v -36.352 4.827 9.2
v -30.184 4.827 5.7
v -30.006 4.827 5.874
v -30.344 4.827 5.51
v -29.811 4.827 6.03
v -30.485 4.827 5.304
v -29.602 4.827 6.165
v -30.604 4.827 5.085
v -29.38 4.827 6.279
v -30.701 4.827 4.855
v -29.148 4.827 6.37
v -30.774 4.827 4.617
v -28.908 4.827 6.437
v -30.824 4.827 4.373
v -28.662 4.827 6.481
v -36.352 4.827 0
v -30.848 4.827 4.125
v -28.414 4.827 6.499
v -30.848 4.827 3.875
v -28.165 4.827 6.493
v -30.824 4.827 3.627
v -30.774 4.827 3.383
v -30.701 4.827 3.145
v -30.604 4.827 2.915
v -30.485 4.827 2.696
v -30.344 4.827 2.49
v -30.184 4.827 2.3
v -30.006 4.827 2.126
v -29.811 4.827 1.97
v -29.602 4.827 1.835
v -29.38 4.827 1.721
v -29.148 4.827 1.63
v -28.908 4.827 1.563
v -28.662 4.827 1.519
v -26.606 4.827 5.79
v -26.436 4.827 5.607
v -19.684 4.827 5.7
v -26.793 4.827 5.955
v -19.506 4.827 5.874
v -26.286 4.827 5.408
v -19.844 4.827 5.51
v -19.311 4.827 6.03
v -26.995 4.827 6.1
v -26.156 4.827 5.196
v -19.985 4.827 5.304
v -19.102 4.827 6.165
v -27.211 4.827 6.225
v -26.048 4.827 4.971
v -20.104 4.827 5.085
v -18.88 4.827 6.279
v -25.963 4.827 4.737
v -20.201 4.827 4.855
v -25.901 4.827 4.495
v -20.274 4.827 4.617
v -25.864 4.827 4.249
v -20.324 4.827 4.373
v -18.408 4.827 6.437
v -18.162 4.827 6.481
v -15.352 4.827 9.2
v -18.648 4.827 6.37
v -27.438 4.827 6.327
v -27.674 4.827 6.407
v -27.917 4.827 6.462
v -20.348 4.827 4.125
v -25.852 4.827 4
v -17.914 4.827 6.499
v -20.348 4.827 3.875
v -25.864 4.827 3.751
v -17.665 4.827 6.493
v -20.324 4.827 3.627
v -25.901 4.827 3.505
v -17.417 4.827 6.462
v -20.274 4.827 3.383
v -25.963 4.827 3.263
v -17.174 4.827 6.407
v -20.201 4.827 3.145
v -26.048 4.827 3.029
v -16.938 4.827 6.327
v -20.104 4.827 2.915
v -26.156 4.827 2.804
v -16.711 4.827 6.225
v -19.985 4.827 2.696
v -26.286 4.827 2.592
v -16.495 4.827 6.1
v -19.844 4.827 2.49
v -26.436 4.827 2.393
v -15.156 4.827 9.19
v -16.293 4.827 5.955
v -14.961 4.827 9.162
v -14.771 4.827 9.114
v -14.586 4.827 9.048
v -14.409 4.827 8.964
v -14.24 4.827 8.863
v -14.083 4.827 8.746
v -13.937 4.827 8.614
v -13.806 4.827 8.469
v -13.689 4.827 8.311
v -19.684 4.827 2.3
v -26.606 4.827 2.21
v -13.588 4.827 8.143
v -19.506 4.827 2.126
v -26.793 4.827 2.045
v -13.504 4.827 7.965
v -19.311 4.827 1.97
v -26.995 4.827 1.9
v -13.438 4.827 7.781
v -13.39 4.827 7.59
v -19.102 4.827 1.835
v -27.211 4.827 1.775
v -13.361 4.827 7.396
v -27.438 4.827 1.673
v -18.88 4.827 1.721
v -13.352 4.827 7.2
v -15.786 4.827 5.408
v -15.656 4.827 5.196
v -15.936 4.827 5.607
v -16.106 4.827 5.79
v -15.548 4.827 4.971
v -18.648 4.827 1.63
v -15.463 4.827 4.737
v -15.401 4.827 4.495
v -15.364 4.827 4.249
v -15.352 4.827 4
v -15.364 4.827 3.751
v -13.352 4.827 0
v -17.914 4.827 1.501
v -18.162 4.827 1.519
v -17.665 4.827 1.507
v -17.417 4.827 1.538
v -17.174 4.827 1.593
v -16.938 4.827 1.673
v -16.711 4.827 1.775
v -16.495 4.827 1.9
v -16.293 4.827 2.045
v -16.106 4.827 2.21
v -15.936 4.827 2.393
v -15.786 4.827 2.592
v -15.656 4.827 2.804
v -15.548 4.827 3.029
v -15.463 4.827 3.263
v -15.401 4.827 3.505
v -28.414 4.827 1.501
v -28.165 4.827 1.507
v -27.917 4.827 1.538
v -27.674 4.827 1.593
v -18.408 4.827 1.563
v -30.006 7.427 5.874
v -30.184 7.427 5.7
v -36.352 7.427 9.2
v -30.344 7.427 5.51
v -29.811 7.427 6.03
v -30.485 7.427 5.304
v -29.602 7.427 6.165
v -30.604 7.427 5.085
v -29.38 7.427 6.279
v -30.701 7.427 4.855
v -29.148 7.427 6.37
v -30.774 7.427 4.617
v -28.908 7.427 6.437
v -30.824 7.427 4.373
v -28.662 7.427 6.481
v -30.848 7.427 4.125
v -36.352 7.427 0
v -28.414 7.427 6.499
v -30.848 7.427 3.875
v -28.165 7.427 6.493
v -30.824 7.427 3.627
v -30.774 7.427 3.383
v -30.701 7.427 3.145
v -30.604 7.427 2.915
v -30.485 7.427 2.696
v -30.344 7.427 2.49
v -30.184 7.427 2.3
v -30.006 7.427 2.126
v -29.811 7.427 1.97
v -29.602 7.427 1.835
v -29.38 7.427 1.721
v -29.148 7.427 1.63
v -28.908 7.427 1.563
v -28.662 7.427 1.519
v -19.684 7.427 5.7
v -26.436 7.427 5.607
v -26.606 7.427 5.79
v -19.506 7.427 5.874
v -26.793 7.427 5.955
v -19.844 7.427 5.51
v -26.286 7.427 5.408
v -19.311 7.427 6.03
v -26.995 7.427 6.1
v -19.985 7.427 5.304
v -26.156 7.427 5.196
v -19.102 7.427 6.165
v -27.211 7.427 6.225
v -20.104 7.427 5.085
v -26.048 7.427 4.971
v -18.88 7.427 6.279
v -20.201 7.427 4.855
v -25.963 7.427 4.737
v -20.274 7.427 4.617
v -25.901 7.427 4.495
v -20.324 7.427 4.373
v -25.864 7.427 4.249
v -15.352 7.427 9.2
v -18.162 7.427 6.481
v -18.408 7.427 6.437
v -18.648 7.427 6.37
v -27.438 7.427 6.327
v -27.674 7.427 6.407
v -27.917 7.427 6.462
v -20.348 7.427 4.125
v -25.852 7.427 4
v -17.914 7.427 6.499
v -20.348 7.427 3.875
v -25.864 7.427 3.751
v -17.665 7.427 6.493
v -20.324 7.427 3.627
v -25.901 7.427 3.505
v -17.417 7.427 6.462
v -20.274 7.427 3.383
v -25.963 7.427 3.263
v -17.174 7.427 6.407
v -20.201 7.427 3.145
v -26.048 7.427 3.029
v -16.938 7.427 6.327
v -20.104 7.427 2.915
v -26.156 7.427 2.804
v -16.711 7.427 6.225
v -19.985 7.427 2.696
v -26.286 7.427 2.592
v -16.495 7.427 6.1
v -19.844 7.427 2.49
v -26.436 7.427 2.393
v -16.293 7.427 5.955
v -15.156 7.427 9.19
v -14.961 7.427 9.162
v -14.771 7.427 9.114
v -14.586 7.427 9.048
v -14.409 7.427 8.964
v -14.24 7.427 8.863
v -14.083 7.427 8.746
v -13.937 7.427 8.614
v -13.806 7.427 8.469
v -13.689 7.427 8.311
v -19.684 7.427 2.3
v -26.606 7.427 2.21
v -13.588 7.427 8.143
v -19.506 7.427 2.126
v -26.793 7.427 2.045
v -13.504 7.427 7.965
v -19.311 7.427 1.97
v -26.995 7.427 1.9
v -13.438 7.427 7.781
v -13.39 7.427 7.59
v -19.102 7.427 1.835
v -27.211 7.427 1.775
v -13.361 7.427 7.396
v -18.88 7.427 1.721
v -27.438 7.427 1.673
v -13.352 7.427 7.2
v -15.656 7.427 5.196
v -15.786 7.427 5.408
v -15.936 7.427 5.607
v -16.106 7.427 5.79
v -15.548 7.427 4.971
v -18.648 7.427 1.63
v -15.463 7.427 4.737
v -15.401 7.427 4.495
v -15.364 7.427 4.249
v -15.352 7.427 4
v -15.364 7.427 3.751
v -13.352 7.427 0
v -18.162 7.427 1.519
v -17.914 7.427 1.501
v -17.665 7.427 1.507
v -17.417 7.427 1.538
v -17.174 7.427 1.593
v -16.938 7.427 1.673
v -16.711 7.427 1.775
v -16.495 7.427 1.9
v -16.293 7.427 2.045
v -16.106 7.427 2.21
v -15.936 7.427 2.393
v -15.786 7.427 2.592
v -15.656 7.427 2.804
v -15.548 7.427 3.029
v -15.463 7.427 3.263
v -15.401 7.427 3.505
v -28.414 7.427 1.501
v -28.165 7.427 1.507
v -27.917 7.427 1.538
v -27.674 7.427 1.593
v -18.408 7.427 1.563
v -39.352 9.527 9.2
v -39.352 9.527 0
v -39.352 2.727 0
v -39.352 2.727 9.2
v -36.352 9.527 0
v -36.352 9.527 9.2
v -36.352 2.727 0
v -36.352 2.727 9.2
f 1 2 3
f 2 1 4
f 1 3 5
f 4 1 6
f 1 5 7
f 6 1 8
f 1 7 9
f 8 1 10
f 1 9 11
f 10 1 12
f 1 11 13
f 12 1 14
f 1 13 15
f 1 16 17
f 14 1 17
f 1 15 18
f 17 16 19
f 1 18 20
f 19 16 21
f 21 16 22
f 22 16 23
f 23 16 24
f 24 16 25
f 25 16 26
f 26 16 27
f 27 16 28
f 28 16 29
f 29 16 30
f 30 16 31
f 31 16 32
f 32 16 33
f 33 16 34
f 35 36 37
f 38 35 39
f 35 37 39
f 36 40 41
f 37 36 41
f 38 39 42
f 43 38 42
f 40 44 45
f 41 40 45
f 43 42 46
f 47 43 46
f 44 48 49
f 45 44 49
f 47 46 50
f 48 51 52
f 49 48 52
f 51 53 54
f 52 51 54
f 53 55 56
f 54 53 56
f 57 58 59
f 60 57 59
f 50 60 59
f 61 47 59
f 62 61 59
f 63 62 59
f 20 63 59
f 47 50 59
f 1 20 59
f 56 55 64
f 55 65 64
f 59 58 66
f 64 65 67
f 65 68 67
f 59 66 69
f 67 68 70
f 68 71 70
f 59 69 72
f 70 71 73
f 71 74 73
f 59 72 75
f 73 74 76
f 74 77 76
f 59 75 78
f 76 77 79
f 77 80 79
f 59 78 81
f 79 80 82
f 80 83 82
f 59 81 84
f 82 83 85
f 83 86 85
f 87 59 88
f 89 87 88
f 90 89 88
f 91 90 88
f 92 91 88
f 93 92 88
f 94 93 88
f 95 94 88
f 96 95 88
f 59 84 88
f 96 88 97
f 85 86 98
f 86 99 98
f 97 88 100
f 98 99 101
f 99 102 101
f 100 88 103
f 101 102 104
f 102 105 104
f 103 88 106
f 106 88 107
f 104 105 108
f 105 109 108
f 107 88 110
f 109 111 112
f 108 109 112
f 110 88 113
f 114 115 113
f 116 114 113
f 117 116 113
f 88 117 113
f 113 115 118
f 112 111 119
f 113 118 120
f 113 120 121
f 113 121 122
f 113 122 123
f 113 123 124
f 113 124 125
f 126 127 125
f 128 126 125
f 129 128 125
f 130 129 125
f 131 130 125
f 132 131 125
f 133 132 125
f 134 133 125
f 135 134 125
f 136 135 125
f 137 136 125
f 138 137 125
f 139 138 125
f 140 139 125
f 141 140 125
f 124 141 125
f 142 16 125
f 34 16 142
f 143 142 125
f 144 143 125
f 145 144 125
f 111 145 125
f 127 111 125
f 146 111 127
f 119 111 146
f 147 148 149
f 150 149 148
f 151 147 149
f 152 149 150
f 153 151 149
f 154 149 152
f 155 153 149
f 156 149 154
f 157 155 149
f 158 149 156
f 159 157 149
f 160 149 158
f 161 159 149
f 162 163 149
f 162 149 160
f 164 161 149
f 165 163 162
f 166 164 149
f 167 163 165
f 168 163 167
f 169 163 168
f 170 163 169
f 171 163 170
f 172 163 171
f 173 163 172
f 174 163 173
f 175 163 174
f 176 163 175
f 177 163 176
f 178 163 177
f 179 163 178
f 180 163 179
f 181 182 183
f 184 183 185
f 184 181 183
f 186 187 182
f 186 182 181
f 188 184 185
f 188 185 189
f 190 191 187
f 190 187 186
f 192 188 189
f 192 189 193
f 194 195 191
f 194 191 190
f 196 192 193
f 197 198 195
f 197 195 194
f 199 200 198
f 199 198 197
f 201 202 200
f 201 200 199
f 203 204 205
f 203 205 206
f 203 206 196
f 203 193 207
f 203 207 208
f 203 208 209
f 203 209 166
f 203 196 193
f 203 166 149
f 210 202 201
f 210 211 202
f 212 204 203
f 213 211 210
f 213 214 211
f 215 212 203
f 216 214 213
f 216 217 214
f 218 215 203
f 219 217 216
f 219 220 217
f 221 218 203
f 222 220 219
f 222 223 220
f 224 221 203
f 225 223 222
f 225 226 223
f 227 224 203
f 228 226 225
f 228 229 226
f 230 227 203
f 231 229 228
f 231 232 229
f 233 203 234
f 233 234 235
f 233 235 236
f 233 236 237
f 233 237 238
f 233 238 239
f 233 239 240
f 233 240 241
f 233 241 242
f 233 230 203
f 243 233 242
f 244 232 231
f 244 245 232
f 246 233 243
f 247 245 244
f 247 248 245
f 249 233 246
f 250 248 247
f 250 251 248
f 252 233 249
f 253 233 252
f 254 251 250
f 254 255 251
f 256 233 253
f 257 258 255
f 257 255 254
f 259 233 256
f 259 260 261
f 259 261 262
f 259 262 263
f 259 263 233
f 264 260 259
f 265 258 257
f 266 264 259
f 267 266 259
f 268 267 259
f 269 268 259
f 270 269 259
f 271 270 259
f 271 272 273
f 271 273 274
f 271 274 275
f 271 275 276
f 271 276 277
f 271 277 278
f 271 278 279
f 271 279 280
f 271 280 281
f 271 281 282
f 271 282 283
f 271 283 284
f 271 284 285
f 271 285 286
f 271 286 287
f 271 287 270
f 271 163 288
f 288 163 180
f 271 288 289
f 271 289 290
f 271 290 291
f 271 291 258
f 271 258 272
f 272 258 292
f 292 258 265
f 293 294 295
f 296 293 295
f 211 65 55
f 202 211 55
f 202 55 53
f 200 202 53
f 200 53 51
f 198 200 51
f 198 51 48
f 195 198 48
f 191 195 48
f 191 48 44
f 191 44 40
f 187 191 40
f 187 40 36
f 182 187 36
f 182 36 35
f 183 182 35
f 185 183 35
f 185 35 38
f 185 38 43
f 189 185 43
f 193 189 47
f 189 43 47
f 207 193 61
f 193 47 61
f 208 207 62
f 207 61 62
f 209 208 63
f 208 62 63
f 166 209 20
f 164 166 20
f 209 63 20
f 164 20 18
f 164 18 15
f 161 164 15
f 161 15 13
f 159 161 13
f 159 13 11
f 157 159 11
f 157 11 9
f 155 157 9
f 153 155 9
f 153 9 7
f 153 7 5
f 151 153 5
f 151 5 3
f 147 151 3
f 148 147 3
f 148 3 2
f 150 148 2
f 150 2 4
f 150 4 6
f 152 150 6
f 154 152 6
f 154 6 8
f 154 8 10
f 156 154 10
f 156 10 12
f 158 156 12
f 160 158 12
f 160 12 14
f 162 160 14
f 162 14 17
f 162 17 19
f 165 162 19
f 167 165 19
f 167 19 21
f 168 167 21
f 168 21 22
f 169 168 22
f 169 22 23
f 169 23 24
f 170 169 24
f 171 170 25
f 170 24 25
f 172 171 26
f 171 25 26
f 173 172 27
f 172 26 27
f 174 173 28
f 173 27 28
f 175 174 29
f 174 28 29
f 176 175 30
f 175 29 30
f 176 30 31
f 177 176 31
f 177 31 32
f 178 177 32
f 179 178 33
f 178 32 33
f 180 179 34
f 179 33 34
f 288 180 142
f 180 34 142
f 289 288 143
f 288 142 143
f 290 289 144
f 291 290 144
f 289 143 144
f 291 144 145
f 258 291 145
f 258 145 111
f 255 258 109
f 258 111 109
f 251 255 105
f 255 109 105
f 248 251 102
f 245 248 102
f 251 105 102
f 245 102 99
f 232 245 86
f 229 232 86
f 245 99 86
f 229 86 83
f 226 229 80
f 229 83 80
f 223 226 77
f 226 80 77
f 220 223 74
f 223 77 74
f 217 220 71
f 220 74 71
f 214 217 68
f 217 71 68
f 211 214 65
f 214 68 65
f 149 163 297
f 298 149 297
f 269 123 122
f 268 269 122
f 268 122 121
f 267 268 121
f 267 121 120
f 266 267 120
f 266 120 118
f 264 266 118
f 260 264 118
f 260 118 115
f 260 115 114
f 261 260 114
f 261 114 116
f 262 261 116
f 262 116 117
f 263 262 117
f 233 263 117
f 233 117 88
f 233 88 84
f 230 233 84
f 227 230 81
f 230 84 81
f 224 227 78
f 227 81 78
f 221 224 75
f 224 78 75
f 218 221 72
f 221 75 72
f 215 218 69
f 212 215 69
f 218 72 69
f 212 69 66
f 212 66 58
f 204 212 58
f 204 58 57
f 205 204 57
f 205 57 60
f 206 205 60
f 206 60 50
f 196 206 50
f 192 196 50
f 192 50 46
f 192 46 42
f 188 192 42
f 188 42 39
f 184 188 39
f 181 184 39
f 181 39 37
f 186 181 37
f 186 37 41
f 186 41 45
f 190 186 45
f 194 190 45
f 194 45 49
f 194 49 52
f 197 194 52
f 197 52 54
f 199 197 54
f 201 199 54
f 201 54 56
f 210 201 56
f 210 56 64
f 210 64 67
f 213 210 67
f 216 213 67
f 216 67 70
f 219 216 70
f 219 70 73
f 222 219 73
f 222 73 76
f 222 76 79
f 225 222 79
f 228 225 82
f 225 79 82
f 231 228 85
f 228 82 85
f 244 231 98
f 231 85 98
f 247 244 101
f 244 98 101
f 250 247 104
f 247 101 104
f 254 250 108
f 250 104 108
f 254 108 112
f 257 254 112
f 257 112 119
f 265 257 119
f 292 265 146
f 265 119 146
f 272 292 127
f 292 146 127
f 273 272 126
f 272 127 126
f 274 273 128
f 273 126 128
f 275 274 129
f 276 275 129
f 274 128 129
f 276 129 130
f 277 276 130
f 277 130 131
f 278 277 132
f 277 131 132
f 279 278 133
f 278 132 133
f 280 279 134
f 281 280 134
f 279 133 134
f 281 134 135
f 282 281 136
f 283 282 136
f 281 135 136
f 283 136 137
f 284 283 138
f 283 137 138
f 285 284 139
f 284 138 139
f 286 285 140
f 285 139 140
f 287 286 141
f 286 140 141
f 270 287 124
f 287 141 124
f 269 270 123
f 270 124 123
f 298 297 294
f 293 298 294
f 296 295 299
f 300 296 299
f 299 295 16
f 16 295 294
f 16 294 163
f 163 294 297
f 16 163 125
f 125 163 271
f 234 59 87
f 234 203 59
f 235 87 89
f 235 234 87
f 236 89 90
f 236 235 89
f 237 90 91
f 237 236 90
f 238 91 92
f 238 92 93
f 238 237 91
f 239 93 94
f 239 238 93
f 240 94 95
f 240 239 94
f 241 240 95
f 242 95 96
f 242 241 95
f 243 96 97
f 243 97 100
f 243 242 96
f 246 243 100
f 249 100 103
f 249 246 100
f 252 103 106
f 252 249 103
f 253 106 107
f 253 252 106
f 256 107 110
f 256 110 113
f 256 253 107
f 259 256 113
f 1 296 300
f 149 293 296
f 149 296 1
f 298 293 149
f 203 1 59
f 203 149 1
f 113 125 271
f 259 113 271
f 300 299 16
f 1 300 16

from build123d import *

# Parameters (mm, degrees)
F0_W     = 23
F0_H     = 2.6
F1_DEPTH = 9.2
F2_R     = 2.5
F3_DEPTH = 3.1
F4_R     = 2


with BuildPart() as f1:
    # F0 (on Top) → F1 (new body)
    with BuildSketch(Plane.XY):
        Polygon((-39.351552, 9.527253), (-39.351552, 2.727253), (-36.351552, 2.727253), (-36.351552, 4.827253), (-36.351552, 7.427253), (-36.351552, 9.527253), align=None)
        with Locations((-24.851552, 6.127253)):
            Rectangle(F0_W, F0_H)
    extrude(amount=F1_DEPTH)

    # F2 (on face) → F3 (cut)
    with BuildSketch(Plane.XZ.offset(-4.827253)):
        with Locations((-28.351552, 4)):
            Circle(F2_R)
        with Locations((-17.851552, 4)):
            Circle(F2_R)
    extrude(amount=-F3_DEPTH, mode=Mode.SUBTRACT)

    # F4
    f4_edges = [f1.edges().sort_by_distance(p)[0] for p in [
        (-13.351552, 6.127253, 9.2),
    ]]
    fillet(f4_edges, radius=F4_R)


solid = f1.part
